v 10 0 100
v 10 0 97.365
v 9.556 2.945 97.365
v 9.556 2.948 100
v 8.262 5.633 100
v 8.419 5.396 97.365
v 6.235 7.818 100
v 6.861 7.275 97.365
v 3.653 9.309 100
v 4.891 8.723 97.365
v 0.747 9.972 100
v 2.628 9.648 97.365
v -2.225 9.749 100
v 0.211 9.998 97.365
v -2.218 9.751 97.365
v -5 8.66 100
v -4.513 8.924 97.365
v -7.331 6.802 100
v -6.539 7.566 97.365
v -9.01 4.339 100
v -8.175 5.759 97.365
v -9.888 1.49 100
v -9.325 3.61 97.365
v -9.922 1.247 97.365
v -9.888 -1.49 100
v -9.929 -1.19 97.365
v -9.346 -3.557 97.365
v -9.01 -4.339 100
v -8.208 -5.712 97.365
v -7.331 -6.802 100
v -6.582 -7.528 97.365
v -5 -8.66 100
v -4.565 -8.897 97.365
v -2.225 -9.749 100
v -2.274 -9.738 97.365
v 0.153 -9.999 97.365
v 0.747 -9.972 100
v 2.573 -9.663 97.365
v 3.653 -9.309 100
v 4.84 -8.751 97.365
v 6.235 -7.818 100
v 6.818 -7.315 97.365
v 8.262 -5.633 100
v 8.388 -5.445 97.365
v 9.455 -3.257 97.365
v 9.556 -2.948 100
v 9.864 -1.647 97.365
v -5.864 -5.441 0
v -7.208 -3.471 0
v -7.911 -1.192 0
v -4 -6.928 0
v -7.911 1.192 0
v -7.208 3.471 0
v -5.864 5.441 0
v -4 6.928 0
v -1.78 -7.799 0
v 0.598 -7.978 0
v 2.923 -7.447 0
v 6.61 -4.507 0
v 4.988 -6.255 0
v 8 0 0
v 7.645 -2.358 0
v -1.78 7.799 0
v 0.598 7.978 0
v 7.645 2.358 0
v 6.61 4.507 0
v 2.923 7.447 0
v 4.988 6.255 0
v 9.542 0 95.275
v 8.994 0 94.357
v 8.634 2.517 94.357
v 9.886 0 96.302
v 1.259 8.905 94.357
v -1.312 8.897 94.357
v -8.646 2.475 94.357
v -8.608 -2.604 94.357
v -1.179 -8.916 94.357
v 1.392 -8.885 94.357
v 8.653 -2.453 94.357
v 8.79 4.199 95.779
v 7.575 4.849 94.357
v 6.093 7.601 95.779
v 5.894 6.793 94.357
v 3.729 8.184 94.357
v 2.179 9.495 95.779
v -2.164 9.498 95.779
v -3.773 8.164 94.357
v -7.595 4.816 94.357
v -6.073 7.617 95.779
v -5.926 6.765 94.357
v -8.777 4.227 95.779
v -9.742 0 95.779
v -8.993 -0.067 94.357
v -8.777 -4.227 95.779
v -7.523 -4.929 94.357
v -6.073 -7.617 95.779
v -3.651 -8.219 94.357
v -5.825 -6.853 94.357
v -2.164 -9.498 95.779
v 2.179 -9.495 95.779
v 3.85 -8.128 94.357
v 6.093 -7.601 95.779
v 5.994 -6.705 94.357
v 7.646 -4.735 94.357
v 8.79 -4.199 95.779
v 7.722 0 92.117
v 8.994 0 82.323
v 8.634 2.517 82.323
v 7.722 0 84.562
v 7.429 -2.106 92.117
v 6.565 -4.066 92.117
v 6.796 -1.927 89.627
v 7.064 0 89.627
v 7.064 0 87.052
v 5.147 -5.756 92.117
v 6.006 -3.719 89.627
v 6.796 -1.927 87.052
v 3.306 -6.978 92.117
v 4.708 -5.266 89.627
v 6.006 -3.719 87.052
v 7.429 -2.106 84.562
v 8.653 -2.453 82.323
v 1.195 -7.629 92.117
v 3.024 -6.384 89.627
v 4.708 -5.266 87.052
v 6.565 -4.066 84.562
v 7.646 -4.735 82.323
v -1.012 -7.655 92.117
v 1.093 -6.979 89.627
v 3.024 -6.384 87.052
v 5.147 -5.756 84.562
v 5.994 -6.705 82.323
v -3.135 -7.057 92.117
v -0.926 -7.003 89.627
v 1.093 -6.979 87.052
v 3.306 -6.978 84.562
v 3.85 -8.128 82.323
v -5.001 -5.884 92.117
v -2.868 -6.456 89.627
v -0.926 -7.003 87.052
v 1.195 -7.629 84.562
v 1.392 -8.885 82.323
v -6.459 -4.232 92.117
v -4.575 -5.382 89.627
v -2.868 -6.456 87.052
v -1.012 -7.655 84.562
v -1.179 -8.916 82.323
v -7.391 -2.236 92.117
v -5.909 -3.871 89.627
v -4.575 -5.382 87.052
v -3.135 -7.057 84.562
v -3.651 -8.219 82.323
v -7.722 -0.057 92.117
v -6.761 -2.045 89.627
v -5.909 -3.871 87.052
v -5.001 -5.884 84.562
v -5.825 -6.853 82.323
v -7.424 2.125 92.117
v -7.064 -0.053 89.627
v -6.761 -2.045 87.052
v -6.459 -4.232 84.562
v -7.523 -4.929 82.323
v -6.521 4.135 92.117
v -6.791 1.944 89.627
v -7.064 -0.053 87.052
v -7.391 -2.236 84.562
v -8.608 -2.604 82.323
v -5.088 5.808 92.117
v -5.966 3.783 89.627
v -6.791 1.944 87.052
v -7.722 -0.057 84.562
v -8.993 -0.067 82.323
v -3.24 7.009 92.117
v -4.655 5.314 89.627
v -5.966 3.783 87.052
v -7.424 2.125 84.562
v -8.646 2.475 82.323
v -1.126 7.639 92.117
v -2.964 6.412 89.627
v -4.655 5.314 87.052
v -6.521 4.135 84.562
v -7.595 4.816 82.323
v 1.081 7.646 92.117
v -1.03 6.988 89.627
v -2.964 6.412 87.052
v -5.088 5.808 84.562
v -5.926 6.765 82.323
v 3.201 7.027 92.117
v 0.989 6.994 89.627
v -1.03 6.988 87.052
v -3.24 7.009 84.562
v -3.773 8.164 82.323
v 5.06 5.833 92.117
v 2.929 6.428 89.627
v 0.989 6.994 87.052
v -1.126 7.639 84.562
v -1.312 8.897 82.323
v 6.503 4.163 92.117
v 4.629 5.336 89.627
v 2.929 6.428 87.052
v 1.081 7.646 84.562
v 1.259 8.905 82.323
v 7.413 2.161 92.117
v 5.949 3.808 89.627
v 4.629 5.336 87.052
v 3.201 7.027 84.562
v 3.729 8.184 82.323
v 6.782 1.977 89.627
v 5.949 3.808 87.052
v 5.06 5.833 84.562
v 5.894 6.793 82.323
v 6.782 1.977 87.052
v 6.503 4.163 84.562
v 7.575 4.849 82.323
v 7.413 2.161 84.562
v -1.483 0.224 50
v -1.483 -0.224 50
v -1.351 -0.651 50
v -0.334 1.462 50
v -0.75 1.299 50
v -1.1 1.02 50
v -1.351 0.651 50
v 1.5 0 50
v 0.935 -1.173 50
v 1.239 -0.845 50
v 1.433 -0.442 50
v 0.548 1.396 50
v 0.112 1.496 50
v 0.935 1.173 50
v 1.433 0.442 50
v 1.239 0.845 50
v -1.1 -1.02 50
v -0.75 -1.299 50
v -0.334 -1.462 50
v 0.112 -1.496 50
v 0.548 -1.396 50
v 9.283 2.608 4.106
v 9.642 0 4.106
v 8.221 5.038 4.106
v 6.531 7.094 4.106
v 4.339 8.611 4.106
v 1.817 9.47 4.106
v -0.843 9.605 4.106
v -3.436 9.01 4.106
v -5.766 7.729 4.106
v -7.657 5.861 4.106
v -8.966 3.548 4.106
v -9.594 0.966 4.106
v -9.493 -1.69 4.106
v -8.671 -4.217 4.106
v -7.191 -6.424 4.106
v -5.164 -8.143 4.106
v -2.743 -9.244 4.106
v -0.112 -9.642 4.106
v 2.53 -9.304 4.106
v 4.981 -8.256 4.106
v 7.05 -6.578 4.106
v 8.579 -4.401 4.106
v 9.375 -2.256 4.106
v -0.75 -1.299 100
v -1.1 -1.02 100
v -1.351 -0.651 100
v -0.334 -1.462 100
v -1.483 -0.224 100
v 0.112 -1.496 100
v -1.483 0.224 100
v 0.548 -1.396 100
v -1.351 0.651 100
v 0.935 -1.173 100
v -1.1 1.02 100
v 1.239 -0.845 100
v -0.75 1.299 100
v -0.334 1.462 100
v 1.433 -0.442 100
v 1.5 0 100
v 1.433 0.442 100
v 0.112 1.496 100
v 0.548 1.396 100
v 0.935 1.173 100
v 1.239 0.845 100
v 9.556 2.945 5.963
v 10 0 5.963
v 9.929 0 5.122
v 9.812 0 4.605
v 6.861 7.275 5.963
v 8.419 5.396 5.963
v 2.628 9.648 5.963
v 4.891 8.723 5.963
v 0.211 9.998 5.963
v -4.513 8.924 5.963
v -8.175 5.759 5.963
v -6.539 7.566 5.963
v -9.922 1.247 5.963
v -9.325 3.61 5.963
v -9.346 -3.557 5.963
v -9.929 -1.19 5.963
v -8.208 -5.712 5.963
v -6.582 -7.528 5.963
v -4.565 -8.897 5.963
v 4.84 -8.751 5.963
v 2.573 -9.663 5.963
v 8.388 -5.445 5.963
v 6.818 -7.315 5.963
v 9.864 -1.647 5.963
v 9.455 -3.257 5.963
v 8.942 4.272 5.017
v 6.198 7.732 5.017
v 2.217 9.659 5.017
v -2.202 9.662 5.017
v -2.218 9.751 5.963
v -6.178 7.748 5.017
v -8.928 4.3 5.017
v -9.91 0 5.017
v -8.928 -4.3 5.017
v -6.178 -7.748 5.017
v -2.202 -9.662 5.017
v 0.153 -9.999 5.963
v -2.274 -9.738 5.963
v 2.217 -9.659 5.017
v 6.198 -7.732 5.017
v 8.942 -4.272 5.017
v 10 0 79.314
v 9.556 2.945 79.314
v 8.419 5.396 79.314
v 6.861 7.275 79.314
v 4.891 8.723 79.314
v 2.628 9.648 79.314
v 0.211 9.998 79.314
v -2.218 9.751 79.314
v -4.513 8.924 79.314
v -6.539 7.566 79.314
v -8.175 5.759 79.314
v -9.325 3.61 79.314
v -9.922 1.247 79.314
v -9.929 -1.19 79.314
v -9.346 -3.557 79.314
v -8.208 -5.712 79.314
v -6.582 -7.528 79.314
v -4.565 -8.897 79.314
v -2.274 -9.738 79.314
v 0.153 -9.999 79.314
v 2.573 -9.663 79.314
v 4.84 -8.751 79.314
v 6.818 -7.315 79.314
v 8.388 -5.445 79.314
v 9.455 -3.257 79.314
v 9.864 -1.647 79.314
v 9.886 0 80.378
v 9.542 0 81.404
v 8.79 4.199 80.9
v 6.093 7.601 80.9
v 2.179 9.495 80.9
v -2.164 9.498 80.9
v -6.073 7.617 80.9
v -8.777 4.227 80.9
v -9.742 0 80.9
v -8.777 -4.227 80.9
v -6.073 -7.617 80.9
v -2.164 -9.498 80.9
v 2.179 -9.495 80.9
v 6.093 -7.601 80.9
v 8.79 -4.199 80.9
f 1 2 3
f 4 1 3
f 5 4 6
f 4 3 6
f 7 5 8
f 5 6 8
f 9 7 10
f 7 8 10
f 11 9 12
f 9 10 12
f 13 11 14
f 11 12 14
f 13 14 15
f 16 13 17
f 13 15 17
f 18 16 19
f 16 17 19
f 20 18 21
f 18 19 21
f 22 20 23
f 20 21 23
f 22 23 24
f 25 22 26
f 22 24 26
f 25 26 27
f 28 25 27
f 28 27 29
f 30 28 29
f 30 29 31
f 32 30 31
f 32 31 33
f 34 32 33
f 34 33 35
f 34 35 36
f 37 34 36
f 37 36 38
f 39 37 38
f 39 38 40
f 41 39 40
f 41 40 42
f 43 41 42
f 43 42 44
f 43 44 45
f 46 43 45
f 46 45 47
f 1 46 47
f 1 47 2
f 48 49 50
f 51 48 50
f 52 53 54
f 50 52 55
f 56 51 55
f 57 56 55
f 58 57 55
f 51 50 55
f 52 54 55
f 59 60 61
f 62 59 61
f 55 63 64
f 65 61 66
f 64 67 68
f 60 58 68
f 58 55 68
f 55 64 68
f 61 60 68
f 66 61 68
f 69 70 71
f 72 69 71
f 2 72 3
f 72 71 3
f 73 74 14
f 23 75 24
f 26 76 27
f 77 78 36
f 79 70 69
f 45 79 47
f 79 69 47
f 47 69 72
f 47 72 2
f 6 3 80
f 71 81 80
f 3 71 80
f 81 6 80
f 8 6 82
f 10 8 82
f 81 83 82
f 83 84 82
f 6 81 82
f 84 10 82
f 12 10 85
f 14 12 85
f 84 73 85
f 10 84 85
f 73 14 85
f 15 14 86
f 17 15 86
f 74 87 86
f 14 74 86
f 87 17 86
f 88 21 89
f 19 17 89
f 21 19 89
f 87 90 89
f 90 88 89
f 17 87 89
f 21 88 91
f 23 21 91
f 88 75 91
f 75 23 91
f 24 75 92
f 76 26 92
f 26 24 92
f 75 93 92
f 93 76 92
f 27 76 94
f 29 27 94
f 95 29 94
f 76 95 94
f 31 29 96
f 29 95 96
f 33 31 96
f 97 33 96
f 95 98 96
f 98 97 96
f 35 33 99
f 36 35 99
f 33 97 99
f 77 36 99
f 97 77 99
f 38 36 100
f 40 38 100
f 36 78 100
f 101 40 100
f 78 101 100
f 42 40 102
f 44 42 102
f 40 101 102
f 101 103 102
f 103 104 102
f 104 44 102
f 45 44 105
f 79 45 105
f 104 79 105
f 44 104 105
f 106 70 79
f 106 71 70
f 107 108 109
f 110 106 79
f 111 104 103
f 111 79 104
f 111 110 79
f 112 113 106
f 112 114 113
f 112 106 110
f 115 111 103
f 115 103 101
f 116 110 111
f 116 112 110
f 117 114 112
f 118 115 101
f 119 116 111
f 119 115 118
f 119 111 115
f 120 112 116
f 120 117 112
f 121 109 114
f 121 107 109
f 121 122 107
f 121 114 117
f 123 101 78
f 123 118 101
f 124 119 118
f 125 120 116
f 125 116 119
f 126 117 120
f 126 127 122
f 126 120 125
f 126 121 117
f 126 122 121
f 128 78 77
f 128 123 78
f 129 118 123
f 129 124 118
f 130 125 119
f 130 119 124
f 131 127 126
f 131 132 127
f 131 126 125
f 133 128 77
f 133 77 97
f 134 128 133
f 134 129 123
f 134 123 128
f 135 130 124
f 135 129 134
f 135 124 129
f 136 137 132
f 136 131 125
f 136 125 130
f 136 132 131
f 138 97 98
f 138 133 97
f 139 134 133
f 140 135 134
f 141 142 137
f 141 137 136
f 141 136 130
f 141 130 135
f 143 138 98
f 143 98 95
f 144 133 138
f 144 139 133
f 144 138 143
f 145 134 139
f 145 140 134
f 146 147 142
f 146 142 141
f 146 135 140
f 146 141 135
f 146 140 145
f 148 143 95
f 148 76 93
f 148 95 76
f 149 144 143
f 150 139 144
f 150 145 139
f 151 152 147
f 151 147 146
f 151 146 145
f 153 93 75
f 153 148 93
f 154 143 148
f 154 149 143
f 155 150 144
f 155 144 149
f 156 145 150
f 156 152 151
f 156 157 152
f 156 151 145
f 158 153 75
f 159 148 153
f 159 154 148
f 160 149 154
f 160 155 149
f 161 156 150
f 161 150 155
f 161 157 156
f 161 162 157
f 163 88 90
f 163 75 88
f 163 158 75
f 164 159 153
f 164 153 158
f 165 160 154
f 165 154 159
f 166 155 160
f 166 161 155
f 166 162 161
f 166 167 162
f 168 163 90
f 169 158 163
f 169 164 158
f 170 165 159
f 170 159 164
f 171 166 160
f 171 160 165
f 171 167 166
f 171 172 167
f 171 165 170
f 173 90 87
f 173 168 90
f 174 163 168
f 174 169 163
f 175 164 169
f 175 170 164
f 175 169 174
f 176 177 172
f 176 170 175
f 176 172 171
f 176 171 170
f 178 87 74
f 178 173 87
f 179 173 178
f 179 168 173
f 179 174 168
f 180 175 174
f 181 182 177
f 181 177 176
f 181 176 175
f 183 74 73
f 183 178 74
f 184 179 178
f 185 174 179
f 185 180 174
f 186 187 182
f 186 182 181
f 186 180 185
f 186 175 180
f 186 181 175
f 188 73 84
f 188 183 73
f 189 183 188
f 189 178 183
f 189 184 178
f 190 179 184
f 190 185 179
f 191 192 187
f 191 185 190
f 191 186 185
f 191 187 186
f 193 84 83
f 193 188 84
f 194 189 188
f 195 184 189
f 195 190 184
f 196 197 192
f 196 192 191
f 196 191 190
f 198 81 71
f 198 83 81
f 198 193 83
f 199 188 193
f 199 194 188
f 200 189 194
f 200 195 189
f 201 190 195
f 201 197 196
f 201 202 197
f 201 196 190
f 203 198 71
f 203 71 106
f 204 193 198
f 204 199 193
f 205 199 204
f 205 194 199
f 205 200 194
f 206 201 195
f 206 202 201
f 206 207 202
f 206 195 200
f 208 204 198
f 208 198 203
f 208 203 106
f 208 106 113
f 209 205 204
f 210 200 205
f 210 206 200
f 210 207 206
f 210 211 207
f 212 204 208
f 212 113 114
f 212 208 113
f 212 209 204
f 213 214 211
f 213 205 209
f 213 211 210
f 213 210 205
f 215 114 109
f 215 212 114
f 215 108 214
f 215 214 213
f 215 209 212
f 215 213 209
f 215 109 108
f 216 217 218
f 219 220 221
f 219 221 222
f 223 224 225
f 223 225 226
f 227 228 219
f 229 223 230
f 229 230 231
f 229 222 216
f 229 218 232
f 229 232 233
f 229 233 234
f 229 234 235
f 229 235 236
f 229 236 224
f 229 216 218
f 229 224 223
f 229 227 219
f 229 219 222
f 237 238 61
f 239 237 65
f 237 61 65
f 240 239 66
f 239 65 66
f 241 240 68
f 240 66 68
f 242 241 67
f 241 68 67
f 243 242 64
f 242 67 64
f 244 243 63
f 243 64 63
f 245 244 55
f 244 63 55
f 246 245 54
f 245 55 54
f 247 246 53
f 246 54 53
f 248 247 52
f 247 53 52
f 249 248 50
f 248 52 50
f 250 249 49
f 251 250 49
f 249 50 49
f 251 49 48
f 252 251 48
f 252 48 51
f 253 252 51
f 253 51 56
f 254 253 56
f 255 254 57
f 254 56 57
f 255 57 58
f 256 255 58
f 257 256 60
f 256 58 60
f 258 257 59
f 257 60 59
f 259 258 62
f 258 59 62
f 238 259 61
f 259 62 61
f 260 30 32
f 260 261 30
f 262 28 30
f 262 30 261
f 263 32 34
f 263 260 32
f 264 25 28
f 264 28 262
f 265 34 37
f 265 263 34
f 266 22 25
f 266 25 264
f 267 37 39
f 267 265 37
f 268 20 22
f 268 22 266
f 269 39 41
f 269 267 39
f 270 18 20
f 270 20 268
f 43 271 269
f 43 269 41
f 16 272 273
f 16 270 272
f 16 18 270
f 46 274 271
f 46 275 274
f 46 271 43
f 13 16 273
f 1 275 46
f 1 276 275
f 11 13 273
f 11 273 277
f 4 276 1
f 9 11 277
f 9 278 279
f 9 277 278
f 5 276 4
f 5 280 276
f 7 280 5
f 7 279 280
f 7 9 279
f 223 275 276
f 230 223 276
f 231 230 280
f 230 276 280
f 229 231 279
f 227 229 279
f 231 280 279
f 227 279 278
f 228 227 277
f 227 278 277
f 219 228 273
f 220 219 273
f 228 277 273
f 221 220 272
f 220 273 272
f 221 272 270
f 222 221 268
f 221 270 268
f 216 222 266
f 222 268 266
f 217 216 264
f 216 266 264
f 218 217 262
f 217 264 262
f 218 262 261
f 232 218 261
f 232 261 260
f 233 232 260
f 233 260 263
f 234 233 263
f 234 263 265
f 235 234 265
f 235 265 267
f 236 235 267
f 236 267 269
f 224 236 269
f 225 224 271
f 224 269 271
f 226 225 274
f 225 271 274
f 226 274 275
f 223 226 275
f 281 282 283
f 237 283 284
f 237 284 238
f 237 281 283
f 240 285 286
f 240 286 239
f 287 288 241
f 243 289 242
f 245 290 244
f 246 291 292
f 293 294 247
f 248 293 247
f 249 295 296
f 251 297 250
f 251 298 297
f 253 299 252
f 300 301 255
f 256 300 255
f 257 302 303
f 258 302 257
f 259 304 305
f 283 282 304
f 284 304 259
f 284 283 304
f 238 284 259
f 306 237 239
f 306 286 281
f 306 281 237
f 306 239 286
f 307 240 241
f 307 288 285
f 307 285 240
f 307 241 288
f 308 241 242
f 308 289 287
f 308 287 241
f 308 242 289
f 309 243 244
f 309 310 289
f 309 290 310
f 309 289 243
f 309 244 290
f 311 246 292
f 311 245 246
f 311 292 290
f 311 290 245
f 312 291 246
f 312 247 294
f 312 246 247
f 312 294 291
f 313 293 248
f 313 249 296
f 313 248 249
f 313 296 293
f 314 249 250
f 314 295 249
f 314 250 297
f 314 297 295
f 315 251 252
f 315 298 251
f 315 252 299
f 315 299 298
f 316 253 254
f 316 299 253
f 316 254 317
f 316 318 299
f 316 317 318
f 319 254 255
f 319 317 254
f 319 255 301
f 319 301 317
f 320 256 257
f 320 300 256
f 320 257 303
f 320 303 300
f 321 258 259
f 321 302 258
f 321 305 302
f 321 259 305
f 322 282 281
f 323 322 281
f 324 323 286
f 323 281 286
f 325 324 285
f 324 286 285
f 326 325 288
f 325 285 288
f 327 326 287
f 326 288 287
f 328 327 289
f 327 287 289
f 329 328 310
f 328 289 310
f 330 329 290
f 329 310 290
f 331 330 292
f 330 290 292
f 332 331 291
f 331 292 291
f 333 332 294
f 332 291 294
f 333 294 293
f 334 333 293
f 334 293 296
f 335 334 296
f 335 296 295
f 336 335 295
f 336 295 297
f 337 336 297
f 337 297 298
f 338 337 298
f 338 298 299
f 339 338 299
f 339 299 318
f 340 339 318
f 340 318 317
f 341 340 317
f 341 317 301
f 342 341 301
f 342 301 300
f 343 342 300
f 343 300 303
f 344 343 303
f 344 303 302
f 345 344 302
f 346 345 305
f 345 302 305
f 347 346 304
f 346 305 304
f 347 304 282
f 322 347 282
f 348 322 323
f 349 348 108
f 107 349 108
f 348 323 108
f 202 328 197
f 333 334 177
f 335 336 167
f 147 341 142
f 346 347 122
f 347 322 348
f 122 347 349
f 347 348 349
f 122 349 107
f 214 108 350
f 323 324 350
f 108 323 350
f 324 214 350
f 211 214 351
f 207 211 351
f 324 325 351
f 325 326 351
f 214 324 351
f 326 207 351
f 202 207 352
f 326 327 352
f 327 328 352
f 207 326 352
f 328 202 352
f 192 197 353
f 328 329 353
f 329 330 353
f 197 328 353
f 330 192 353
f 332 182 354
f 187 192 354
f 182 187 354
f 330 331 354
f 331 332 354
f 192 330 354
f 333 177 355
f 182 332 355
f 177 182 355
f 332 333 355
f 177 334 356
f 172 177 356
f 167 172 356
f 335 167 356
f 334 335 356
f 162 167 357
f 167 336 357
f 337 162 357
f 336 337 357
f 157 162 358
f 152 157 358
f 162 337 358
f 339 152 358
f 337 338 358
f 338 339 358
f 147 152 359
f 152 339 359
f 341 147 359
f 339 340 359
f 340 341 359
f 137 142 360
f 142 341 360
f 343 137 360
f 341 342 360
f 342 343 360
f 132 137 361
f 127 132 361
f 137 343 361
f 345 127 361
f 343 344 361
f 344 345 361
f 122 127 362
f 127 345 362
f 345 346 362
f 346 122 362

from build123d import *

# Parameters (mm, degrees)
F2_R     = 10
F3_DEPTH = 100
F4_SIZE2 = 2
F4_SIZE  = 5
F5_R     = 1.5
F6_DEPTH = 50
F9_R     = 5
F10_R    = 5


# Not quite as in the source:
# - two fillets or chamfers of one size are made in one step


with BuildPart() as f3:
    # F2 (on Top) → F3 (new body)
    with BuildSketch(Plane.XY):
        Circle(F2_R)
    extrude(amount=F3_DEPTH)

    # F4
    f4_edges = [f3.edges().sort_by_distance(p)[0] for p in [
        (-10, 0, 0),
    ]]
    f4_side = f3.faces().sort_by_distance((-10, 0, 50))[0]
    chamfer(f4_edges, length=F4_SIZE, length2=F4_SIZE2, reference=f4_side)

    # F5 (on face) → F6 (cut)
    with BuildSketch(Plane.XY.offset(100)):
        Circle(F5_R)
    extrude(amount=-F6_DEPTH, mode=Mode.SUBTRACT)

    # F7 (on Front) → F8 (revolve, cut)
    with BuildSketch(Plane.XZ):
        with BuildLine():
            Line((13.1810711939, 79.0897459622), (13.1810711939, 97.5897459622))
            ThreePointArc((13.1810711939, 97.5897459622), (6.9807422323, 88.3397459622), (13.1810711939, 79.0897459622))
        make_face()
    revolve(axis=Axis((0, 0, 50), (0, 0, -1)), mode=Mode.SUBTRACT)

    # F9
    f9_edges = [f3.edges().sort_by_distance(p)[0] for p in [
        (-10, 0, 81.179492),
    ]]
    fillet(f9_edges, radius=F9_R)

    # F10
    f10_edges = [f3.edges().sort_by_distance(p)[0] for p in [
        (-10, 0, 5),
        (-10, 0, 95.5),
    ]]
    fillet(f10_edges, radius=F10_R)


solid = f3.part
